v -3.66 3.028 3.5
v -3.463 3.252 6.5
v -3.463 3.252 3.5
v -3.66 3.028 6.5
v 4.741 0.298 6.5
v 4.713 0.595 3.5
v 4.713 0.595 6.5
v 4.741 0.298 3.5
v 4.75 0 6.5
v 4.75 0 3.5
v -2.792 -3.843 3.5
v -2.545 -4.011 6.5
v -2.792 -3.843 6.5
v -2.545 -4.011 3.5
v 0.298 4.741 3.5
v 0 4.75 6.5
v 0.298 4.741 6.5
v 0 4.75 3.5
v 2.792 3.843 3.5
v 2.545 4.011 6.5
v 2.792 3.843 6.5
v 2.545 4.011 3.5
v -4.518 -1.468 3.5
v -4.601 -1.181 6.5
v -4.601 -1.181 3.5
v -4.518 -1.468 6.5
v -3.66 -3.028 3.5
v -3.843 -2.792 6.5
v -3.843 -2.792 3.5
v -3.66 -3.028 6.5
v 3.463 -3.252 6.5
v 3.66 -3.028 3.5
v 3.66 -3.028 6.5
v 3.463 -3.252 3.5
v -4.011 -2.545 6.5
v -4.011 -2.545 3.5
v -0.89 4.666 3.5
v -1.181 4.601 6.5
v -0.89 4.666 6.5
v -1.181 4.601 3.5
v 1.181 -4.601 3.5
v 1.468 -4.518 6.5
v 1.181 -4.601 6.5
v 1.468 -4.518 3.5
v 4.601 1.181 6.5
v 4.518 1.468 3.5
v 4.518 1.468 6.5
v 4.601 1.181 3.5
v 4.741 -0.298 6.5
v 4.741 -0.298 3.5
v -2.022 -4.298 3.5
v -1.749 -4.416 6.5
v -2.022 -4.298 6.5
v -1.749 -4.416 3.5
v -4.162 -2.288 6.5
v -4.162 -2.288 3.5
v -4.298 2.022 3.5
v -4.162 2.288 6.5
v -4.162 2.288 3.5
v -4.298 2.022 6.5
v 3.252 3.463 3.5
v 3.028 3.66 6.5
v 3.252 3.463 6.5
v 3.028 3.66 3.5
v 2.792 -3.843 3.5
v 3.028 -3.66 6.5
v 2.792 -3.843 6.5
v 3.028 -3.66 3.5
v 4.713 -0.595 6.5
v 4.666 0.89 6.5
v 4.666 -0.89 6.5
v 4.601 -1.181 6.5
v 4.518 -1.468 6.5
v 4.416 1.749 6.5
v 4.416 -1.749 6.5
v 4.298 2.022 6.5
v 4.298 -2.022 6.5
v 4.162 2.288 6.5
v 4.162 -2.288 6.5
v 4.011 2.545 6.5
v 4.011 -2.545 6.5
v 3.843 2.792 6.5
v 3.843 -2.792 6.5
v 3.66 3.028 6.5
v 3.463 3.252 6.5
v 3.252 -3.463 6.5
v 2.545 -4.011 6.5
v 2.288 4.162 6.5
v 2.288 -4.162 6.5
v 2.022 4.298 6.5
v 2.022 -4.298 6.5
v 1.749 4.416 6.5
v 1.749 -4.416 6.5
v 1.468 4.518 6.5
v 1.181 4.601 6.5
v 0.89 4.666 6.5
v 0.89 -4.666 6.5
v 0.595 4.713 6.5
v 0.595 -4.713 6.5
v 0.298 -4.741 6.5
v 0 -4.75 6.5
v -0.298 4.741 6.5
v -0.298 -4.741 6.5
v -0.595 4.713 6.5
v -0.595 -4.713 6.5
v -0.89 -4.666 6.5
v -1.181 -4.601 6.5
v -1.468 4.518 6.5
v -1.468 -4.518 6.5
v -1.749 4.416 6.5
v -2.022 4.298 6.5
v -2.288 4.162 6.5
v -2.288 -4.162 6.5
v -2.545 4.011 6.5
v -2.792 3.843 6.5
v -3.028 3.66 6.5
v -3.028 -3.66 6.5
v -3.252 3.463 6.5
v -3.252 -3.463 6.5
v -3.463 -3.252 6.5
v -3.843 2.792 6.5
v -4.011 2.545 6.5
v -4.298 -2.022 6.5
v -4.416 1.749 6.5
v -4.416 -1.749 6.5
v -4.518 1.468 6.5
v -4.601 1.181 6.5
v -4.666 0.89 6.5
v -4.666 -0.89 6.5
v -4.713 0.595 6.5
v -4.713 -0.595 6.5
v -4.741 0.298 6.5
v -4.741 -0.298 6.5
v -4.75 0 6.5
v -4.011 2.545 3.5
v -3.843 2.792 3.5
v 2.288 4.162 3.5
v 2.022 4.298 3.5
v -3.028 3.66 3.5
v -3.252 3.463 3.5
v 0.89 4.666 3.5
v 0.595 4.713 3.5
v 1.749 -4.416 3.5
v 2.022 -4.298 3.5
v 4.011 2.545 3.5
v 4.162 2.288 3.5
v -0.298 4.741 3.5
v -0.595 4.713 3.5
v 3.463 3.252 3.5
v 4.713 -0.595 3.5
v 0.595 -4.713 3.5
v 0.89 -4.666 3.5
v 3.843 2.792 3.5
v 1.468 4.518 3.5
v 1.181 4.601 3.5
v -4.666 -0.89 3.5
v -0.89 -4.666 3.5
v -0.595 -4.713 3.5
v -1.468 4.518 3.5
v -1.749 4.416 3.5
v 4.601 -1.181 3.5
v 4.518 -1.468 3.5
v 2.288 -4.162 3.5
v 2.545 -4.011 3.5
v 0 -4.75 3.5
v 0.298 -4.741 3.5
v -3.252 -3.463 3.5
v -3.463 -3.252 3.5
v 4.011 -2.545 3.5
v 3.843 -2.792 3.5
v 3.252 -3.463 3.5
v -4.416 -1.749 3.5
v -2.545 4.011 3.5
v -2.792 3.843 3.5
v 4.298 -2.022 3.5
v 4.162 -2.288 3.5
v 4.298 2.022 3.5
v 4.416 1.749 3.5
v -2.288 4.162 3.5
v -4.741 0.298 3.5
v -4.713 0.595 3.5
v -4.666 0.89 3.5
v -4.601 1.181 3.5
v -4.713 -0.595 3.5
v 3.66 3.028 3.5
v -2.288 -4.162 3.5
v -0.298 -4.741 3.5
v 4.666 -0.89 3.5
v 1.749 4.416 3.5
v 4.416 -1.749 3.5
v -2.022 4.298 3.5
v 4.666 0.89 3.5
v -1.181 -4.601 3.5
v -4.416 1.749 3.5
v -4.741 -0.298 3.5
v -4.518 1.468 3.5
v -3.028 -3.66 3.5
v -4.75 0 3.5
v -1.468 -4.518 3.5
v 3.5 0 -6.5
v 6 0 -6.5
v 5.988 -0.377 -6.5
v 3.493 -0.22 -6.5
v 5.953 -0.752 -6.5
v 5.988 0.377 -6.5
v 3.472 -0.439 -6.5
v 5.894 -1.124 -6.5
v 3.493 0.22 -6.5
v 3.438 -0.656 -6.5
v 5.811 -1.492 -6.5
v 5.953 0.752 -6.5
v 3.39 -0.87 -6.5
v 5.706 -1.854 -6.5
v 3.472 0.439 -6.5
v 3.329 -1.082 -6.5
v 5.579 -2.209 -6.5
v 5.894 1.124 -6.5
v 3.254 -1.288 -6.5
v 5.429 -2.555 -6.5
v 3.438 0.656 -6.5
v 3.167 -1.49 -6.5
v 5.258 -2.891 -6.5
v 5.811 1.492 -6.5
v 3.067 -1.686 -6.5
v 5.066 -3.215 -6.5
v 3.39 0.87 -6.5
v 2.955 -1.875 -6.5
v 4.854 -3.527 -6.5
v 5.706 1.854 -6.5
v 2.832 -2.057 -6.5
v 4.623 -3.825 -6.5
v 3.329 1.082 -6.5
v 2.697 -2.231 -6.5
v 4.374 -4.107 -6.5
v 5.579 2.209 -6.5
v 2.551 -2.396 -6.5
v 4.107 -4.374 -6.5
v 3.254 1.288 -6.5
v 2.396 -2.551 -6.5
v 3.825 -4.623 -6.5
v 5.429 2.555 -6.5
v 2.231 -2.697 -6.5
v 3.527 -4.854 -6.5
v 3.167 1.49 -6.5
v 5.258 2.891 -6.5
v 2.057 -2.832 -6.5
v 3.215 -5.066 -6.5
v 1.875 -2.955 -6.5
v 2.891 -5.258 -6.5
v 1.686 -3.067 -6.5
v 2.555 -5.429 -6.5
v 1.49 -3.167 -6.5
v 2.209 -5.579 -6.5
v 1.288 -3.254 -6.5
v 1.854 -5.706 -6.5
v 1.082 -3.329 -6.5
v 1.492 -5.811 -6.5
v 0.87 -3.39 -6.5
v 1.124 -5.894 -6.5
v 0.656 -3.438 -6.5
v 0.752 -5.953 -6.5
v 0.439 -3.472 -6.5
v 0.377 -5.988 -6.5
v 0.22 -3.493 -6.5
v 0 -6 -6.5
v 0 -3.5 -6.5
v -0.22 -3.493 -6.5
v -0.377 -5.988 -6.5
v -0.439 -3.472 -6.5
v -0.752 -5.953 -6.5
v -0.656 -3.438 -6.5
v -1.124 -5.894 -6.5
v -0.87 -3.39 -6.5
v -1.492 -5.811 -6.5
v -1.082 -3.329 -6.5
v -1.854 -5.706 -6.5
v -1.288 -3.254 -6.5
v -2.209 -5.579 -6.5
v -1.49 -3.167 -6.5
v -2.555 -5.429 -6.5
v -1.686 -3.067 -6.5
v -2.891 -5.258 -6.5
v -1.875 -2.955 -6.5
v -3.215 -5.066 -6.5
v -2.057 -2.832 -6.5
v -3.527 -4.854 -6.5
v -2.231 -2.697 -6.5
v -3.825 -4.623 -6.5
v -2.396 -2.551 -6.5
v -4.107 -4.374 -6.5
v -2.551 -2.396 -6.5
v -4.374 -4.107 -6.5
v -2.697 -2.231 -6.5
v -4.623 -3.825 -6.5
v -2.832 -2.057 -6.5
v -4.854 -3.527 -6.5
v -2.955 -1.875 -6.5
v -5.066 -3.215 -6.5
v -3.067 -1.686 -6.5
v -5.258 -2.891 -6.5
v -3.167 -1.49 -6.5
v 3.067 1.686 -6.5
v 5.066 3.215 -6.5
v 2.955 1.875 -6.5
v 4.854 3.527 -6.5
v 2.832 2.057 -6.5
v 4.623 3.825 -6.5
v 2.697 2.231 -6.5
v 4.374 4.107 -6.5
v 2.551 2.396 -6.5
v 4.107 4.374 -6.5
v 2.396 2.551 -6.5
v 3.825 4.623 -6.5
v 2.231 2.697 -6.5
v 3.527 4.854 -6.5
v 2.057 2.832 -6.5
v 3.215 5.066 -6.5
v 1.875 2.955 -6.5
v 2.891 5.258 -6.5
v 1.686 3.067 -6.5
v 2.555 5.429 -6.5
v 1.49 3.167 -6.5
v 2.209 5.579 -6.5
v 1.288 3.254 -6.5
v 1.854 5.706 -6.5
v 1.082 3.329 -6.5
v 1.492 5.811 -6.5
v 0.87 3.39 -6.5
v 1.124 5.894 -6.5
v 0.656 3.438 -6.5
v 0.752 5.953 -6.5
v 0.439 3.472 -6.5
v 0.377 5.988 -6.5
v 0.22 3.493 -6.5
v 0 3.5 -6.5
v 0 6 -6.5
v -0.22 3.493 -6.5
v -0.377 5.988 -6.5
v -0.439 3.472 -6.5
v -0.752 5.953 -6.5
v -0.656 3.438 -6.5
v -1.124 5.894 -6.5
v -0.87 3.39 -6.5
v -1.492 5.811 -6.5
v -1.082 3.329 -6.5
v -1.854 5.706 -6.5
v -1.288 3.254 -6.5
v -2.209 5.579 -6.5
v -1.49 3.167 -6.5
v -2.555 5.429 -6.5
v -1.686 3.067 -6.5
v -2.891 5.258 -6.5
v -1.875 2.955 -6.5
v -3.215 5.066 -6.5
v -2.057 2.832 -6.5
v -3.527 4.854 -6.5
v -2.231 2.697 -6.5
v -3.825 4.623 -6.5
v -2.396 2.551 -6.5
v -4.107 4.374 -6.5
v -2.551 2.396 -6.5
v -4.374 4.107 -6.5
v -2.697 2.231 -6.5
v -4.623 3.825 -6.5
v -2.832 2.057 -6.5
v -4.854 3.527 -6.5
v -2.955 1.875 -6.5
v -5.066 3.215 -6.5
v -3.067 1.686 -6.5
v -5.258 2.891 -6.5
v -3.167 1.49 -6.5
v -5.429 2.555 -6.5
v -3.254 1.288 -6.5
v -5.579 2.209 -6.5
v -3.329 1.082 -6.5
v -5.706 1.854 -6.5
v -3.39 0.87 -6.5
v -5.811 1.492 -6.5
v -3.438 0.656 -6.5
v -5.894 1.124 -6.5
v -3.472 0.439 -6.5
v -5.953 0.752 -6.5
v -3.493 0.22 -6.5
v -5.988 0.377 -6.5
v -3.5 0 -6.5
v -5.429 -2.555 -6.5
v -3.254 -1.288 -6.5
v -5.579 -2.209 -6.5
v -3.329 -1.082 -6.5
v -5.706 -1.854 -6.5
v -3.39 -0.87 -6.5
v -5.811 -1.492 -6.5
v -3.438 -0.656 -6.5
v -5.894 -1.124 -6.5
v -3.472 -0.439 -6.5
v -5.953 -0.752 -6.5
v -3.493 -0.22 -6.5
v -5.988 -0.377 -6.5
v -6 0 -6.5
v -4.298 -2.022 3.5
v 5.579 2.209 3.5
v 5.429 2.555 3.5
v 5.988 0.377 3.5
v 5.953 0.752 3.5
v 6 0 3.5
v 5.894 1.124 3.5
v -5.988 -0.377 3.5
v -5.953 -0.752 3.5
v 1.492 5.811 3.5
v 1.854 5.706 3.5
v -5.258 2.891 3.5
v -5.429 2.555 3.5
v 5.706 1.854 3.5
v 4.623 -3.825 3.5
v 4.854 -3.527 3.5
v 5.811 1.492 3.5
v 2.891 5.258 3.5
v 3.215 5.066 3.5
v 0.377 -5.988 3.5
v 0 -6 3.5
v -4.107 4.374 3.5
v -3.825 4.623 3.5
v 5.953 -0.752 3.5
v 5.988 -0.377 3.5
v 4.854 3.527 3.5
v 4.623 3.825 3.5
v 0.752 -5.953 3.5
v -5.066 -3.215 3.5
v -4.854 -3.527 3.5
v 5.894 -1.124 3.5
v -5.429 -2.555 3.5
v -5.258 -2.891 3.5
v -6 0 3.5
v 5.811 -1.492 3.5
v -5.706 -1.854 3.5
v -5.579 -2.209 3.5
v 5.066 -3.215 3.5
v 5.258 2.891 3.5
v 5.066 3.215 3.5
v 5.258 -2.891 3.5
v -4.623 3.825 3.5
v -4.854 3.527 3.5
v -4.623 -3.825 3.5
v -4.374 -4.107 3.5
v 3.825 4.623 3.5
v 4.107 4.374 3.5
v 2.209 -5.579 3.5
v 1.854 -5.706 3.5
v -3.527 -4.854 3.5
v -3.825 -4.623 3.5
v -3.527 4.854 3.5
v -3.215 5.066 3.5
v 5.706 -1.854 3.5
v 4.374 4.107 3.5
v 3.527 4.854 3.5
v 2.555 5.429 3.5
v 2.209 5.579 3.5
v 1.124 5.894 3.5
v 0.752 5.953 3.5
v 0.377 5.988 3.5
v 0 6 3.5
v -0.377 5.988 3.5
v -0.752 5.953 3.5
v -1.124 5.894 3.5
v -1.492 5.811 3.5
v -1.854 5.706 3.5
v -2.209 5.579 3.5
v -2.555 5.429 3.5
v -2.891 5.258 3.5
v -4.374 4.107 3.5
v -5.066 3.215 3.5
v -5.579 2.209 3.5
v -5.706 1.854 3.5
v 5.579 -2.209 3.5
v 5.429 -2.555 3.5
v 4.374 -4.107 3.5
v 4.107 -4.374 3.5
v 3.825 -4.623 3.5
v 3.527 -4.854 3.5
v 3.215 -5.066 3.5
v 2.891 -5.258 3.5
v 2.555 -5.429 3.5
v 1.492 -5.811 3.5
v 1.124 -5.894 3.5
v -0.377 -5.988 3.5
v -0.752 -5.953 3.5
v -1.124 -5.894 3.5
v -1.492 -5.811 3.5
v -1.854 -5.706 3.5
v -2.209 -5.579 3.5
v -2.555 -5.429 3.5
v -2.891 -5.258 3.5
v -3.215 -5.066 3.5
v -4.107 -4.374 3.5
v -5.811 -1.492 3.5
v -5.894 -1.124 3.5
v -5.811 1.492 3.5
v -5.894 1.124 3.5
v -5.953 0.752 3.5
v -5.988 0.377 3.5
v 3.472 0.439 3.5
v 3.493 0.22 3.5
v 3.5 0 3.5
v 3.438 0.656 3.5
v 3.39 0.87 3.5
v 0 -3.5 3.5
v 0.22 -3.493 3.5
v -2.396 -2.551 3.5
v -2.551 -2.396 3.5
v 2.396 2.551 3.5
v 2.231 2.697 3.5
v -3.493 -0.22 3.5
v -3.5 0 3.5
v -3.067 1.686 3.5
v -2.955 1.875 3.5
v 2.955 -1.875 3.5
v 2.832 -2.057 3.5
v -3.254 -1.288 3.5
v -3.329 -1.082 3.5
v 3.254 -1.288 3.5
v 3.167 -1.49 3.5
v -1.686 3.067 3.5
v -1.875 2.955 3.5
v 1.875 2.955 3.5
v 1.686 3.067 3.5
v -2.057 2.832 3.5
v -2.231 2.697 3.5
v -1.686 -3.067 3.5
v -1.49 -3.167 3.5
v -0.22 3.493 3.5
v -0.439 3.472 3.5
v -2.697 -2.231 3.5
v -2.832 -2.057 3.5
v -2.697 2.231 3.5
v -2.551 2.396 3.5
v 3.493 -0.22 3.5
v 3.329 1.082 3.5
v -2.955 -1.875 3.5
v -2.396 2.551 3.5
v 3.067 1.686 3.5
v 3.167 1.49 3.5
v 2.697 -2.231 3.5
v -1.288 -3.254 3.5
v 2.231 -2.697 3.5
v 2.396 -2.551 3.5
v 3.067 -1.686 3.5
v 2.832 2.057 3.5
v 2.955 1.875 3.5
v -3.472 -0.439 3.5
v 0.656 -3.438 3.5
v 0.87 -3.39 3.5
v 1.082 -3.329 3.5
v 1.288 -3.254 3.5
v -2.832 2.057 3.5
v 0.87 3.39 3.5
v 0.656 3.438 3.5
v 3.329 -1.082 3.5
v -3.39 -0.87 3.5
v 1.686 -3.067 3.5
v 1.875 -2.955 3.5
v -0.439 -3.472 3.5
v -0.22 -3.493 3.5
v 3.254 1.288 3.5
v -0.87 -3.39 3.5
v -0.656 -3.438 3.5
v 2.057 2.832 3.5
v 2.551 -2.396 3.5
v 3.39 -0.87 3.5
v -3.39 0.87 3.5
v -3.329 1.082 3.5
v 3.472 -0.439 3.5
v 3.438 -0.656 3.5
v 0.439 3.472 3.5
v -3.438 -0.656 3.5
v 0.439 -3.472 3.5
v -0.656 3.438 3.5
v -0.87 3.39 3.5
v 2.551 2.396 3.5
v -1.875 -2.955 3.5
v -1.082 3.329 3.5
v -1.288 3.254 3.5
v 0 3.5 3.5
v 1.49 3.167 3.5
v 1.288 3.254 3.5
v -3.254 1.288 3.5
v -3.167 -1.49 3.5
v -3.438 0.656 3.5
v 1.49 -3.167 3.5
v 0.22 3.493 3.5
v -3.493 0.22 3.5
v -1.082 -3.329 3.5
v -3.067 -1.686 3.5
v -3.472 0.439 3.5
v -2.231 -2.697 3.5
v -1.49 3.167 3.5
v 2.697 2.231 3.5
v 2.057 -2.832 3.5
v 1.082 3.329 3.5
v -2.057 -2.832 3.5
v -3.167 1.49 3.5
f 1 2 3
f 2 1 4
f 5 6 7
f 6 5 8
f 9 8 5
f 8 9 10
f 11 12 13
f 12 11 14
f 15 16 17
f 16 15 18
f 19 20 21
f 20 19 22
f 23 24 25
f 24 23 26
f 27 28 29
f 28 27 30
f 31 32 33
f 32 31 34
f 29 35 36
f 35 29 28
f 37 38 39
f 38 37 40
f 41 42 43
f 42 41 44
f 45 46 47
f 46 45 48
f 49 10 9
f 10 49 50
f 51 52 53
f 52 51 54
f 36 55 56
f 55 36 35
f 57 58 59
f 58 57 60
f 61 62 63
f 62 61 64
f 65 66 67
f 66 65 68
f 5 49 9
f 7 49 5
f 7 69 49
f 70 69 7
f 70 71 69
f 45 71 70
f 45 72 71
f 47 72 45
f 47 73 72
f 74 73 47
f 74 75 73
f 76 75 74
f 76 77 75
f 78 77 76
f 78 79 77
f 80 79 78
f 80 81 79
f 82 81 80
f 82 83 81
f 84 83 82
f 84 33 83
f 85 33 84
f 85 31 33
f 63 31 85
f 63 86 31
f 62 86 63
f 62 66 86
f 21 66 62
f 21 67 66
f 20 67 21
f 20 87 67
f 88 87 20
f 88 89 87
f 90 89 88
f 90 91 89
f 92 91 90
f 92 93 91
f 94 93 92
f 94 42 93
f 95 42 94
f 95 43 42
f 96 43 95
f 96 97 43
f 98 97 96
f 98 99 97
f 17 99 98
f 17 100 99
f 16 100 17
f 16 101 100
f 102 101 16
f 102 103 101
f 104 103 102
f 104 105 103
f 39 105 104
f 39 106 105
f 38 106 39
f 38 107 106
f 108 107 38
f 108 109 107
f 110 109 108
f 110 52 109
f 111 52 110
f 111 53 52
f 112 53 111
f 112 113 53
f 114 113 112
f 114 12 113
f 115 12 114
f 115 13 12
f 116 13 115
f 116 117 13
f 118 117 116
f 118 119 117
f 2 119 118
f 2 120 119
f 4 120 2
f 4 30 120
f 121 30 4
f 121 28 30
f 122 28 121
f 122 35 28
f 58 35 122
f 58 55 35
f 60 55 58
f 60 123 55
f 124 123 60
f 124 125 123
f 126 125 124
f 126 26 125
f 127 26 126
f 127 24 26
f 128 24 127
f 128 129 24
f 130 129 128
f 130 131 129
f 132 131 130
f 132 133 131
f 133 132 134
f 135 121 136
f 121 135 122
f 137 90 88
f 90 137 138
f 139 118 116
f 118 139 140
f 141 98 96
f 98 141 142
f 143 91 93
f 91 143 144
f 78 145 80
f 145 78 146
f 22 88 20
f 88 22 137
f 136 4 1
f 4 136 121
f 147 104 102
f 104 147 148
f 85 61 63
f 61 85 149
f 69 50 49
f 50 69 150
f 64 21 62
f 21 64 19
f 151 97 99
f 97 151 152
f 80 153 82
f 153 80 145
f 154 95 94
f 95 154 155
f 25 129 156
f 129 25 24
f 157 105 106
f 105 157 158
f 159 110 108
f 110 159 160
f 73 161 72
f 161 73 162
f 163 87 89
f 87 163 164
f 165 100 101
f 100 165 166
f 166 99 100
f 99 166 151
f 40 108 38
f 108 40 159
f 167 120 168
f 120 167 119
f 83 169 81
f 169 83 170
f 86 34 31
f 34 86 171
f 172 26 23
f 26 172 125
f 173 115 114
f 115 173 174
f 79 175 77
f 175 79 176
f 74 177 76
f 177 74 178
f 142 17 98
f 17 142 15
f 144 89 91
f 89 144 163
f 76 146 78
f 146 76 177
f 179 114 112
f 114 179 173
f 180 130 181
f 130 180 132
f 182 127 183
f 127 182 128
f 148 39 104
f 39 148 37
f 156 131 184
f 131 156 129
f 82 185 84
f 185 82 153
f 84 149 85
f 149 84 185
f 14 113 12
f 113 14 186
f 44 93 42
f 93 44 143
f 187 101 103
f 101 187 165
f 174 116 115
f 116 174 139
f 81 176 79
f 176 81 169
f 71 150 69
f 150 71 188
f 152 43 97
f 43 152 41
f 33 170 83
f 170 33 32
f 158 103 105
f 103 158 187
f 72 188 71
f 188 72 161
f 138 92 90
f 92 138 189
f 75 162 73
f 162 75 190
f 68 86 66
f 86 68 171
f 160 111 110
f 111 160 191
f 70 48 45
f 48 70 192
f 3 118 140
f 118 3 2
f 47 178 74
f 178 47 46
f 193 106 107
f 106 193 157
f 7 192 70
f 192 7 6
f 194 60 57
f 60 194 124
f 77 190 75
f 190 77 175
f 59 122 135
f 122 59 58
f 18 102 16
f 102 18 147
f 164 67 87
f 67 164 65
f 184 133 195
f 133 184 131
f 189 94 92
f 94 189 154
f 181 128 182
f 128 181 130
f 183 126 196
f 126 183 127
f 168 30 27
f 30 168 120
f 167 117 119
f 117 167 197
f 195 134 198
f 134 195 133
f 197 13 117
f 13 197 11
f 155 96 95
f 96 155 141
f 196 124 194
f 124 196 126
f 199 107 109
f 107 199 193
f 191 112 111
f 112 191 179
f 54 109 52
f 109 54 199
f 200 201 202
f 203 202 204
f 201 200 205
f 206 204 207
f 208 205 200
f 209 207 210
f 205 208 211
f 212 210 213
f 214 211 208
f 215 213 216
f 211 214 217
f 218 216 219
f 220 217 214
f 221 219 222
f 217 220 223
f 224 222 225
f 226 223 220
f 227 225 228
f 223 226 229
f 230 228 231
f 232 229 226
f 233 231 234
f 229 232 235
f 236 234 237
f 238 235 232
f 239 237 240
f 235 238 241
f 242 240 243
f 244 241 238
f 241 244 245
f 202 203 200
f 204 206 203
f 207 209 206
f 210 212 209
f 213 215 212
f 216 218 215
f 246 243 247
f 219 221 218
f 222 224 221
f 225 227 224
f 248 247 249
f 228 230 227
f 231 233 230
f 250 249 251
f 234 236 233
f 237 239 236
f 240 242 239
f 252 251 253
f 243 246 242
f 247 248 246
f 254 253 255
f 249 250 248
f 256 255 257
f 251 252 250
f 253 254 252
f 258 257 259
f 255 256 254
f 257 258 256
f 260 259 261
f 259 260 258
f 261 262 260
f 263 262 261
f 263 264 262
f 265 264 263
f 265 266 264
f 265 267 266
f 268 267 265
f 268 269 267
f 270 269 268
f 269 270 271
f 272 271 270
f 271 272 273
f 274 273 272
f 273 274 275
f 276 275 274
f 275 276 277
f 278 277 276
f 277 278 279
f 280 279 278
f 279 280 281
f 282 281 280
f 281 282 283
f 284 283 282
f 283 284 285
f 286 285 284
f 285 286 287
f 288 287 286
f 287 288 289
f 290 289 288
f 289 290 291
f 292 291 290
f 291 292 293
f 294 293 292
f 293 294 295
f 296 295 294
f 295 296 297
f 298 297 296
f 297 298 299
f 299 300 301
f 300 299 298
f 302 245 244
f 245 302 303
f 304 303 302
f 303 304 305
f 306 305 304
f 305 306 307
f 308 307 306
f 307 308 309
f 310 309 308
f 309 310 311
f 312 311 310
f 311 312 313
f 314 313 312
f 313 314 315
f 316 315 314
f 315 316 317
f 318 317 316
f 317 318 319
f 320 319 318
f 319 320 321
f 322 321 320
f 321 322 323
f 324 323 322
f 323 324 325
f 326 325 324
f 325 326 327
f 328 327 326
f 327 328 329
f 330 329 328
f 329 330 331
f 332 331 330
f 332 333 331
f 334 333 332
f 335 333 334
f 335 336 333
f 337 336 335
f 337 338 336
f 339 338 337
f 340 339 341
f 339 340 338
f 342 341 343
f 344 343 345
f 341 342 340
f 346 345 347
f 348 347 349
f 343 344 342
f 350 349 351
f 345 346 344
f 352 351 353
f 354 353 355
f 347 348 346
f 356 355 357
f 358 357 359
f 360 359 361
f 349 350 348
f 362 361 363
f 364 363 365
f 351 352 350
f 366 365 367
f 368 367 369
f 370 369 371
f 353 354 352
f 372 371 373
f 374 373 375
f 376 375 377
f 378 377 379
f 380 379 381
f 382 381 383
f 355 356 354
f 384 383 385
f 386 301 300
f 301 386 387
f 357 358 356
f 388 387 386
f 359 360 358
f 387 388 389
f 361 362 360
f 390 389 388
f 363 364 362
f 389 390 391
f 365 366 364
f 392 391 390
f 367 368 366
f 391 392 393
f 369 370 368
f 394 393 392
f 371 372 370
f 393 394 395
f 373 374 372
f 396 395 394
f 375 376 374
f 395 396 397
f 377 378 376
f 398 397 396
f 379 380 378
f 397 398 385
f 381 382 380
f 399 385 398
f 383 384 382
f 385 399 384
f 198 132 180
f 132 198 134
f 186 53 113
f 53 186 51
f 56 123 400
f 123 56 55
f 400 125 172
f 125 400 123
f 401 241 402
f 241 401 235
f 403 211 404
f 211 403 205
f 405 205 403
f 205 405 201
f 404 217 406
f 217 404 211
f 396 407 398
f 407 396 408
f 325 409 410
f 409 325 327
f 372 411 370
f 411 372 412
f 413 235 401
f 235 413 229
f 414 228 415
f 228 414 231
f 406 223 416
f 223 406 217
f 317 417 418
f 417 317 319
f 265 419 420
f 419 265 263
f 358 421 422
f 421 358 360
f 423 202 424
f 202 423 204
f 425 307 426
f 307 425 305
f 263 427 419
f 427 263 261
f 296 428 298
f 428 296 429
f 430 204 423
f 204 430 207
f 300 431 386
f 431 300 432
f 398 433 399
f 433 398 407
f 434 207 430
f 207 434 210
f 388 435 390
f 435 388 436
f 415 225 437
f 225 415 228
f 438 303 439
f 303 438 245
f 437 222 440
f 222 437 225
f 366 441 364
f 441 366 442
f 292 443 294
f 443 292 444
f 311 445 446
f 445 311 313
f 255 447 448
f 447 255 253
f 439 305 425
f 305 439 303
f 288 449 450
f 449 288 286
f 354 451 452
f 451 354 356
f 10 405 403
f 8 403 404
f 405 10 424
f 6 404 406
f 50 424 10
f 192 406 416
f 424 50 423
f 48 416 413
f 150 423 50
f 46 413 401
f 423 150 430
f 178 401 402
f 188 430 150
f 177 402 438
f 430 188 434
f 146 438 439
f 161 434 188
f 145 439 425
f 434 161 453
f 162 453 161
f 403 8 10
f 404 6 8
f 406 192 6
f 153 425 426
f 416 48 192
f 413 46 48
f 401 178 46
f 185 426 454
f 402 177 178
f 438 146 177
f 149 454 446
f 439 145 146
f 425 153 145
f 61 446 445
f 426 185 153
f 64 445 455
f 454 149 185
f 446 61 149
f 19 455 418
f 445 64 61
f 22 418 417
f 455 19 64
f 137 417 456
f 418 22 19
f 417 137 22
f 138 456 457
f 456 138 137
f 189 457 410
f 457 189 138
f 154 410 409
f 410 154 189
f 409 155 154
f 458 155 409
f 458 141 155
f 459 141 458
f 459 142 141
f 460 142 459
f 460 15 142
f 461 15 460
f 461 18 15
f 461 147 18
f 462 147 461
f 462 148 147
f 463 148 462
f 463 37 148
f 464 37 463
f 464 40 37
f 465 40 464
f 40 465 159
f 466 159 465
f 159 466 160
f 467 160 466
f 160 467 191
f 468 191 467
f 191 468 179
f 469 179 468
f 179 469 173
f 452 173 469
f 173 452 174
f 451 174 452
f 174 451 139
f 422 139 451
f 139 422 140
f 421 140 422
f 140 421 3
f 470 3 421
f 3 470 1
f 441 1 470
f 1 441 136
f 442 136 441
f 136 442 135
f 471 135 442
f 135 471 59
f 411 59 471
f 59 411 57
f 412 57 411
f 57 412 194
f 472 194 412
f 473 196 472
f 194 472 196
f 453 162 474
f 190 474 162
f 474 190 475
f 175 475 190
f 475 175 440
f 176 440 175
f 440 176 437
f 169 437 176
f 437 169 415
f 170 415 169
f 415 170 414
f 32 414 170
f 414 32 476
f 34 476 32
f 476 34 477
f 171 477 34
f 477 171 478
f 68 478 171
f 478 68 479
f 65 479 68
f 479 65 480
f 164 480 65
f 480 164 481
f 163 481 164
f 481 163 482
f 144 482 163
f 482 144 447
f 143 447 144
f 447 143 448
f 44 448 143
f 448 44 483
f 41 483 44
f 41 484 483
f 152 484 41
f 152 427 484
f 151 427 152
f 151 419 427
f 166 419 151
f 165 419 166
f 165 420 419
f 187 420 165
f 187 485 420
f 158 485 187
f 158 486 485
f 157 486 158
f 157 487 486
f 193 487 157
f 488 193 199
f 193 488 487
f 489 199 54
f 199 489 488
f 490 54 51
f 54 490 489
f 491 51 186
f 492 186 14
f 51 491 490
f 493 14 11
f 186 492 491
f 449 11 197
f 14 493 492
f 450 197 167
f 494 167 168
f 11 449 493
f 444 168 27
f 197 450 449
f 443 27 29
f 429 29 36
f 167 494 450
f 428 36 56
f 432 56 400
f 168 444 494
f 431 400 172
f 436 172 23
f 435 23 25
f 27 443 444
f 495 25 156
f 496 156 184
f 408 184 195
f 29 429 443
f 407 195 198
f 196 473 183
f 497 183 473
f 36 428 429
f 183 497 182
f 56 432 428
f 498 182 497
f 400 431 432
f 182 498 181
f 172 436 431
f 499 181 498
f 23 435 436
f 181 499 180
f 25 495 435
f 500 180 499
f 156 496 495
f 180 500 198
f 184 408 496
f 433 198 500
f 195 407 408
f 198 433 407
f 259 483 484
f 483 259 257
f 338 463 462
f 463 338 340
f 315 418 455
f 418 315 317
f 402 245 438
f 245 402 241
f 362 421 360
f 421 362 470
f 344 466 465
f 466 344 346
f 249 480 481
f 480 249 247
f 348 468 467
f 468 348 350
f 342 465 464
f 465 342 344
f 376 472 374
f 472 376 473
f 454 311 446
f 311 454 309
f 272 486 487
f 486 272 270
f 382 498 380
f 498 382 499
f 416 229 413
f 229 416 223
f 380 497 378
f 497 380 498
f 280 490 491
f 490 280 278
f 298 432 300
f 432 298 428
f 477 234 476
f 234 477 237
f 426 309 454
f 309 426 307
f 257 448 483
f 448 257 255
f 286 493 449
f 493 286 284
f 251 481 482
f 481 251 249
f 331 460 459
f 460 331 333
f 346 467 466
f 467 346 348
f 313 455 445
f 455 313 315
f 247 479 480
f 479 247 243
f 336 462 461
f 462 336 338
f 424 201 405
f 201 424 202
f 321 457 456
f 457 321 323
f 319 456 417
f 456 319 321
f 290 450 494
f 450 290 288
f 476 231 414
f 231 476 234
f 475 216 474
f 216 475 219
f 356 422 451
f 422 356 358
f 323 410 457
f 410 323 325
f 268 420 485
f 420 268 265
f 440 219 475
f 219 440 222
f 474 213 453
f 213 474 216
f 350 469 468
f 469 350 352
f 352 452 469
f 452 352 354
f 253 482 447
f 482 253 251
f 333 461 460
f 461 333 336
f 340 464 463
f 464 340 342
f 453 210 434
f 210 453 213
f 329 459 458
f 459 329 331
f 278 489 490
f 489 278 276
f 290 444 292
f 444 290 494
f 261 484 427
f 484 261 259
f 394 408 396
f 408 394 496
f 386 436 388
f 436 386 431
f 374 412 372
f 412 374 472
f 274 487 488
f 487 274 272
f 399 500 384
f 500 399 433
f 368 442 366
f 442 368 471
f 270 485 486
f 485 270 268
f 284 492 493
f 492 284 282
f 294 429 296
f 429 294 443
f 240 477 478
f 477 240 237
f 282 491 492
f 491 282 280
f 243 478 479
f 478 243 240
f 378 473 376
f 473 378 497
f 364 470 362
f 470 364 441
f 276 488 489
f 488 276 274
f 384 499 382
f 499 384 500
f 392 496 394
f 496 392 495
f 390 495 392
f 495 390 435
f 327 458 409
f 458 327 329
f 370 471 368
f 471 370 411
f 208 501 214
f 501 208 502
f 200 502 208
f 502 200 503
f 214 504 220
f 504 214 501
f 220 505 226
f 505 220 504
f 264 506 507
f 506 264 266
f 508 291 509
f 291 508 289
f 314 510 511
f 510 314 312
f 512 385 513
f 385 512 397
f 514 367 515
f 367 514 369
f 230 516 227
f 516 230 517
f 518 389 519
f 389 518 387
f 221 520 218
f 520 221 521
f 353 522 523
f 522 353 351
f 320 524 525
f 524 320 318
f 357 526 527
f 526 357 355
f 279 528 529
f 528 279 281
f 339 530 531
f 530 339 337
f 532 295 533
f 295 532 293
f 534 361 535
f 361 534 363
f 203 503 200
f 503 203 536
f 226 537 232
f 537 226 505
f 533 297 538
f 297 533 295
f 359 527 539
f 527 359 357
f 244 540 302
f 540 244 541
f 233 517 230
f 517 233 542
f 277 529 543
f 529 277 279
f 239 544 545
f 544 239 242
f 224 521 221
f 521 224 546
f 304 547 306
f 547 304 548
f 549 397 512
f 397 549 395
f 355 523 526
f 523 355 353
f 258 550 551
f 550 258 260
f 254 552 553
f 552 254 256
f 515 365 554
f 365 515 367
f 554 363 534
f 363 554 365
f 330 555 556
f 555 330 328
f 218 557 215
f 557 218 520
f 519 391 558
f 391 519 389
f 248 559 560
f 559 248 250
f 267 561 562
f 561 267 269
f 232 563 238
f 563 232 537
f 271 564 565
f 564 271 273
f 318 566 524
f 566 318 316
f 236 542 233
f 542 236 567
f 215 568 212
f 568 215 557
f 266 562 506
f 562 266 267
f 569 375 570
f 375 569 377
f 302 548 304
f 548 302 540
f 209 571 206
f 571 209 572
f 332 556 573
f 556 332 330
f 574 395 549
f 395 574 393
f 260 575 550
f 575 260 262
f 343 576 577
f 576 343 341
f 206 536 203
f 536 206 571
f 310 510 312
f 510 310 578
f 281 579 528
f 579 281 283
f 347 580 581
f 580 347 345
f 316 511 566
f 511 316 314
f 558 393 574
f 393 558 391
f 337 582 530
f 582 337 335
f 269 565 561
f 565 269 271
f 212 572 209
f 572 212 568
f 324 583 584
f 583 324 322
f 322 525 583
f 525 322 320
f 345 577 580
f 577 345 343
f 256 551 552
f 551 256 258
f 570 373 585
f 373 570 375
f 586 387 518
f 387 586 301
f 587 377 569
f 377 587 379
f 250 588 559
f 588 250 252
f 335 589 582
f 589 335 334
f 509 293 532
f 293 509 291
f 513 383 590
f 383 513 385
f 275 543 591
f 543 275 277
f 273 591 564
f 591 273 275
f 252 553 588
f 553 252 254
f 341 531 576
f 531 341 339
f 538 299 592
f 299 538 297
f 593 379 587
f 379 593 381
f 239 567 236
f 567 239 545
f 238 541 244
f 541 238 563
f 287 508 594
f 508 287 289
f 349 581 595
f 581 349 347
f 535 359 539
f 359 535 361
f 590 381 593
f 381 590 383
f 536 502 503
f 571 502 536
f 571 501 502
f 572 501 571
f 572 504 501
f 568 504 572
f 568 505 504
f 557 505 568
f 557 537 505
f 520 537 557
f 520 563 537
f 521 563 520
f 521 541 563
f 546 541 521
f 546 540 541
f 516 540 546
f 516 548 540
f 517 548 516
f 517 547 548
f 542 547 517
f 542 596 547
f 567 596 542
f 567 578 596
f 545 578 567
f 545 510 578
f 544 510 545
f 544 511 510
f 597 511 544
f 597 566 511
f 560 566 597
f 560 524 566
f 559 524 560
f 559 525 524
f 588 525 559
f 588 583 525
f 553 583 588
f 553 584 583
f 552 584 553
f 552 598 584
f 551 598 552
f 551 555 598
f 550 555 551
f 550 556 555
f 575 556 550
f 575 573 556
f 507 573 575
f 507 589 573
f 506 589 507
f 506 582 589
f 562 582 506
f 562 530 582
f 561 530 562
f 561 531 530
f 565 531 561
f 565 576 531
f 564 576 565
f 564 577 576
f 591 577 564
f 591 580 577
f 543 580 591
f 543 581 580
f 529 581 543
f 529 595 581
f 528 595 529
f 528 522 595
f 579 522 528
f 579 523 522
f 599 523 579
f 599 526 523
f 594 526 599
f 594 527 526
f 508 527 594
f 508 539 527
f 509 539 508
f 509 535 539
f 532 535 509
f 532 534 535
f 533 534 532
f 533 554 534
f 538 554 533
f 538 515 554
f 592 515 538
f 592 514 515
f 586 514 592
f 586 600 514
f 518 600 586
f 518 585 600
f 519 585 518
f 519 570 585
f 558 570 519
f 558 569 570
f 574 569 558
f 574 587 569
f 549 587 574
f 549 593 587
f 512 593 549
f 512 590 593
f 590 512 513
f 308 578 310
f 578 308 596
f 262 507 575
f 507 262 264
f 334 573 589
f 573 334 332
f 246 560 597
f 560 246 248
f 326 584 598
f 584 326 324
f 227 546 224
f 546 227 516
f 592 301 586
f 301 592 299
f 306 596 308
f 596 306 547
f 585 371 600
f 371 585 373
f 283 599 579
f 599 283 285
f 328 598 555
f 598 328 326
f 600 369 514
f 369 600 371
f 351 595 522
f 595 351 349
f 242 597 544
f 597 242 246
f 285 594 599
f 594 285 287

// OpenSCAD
// ardutesterButton.scad

totalHeight = 13;
stemHeight = 10;

holeDepth = 10;

topDia = 9.5;
stemDia = 12;
holeDia = 7;

roundness = 100;

difference() {
union() {
color("blue")
cylinder(h = totalHeight, d = topDia, center = true, $fn = roundness);

translate([0, 0, -totalHeight / 2 + stemHeight / 2])
color("green")
cylinder(h = stemHeight, d = stemDia, center = true, $fn = roundness);
}

translate([0, 0, -totalHeight / 2 + holeDepth / 2])
color("red")
cylinder(h = holeDepth, d = holeDia, center = true, $fn = roundness);
}
